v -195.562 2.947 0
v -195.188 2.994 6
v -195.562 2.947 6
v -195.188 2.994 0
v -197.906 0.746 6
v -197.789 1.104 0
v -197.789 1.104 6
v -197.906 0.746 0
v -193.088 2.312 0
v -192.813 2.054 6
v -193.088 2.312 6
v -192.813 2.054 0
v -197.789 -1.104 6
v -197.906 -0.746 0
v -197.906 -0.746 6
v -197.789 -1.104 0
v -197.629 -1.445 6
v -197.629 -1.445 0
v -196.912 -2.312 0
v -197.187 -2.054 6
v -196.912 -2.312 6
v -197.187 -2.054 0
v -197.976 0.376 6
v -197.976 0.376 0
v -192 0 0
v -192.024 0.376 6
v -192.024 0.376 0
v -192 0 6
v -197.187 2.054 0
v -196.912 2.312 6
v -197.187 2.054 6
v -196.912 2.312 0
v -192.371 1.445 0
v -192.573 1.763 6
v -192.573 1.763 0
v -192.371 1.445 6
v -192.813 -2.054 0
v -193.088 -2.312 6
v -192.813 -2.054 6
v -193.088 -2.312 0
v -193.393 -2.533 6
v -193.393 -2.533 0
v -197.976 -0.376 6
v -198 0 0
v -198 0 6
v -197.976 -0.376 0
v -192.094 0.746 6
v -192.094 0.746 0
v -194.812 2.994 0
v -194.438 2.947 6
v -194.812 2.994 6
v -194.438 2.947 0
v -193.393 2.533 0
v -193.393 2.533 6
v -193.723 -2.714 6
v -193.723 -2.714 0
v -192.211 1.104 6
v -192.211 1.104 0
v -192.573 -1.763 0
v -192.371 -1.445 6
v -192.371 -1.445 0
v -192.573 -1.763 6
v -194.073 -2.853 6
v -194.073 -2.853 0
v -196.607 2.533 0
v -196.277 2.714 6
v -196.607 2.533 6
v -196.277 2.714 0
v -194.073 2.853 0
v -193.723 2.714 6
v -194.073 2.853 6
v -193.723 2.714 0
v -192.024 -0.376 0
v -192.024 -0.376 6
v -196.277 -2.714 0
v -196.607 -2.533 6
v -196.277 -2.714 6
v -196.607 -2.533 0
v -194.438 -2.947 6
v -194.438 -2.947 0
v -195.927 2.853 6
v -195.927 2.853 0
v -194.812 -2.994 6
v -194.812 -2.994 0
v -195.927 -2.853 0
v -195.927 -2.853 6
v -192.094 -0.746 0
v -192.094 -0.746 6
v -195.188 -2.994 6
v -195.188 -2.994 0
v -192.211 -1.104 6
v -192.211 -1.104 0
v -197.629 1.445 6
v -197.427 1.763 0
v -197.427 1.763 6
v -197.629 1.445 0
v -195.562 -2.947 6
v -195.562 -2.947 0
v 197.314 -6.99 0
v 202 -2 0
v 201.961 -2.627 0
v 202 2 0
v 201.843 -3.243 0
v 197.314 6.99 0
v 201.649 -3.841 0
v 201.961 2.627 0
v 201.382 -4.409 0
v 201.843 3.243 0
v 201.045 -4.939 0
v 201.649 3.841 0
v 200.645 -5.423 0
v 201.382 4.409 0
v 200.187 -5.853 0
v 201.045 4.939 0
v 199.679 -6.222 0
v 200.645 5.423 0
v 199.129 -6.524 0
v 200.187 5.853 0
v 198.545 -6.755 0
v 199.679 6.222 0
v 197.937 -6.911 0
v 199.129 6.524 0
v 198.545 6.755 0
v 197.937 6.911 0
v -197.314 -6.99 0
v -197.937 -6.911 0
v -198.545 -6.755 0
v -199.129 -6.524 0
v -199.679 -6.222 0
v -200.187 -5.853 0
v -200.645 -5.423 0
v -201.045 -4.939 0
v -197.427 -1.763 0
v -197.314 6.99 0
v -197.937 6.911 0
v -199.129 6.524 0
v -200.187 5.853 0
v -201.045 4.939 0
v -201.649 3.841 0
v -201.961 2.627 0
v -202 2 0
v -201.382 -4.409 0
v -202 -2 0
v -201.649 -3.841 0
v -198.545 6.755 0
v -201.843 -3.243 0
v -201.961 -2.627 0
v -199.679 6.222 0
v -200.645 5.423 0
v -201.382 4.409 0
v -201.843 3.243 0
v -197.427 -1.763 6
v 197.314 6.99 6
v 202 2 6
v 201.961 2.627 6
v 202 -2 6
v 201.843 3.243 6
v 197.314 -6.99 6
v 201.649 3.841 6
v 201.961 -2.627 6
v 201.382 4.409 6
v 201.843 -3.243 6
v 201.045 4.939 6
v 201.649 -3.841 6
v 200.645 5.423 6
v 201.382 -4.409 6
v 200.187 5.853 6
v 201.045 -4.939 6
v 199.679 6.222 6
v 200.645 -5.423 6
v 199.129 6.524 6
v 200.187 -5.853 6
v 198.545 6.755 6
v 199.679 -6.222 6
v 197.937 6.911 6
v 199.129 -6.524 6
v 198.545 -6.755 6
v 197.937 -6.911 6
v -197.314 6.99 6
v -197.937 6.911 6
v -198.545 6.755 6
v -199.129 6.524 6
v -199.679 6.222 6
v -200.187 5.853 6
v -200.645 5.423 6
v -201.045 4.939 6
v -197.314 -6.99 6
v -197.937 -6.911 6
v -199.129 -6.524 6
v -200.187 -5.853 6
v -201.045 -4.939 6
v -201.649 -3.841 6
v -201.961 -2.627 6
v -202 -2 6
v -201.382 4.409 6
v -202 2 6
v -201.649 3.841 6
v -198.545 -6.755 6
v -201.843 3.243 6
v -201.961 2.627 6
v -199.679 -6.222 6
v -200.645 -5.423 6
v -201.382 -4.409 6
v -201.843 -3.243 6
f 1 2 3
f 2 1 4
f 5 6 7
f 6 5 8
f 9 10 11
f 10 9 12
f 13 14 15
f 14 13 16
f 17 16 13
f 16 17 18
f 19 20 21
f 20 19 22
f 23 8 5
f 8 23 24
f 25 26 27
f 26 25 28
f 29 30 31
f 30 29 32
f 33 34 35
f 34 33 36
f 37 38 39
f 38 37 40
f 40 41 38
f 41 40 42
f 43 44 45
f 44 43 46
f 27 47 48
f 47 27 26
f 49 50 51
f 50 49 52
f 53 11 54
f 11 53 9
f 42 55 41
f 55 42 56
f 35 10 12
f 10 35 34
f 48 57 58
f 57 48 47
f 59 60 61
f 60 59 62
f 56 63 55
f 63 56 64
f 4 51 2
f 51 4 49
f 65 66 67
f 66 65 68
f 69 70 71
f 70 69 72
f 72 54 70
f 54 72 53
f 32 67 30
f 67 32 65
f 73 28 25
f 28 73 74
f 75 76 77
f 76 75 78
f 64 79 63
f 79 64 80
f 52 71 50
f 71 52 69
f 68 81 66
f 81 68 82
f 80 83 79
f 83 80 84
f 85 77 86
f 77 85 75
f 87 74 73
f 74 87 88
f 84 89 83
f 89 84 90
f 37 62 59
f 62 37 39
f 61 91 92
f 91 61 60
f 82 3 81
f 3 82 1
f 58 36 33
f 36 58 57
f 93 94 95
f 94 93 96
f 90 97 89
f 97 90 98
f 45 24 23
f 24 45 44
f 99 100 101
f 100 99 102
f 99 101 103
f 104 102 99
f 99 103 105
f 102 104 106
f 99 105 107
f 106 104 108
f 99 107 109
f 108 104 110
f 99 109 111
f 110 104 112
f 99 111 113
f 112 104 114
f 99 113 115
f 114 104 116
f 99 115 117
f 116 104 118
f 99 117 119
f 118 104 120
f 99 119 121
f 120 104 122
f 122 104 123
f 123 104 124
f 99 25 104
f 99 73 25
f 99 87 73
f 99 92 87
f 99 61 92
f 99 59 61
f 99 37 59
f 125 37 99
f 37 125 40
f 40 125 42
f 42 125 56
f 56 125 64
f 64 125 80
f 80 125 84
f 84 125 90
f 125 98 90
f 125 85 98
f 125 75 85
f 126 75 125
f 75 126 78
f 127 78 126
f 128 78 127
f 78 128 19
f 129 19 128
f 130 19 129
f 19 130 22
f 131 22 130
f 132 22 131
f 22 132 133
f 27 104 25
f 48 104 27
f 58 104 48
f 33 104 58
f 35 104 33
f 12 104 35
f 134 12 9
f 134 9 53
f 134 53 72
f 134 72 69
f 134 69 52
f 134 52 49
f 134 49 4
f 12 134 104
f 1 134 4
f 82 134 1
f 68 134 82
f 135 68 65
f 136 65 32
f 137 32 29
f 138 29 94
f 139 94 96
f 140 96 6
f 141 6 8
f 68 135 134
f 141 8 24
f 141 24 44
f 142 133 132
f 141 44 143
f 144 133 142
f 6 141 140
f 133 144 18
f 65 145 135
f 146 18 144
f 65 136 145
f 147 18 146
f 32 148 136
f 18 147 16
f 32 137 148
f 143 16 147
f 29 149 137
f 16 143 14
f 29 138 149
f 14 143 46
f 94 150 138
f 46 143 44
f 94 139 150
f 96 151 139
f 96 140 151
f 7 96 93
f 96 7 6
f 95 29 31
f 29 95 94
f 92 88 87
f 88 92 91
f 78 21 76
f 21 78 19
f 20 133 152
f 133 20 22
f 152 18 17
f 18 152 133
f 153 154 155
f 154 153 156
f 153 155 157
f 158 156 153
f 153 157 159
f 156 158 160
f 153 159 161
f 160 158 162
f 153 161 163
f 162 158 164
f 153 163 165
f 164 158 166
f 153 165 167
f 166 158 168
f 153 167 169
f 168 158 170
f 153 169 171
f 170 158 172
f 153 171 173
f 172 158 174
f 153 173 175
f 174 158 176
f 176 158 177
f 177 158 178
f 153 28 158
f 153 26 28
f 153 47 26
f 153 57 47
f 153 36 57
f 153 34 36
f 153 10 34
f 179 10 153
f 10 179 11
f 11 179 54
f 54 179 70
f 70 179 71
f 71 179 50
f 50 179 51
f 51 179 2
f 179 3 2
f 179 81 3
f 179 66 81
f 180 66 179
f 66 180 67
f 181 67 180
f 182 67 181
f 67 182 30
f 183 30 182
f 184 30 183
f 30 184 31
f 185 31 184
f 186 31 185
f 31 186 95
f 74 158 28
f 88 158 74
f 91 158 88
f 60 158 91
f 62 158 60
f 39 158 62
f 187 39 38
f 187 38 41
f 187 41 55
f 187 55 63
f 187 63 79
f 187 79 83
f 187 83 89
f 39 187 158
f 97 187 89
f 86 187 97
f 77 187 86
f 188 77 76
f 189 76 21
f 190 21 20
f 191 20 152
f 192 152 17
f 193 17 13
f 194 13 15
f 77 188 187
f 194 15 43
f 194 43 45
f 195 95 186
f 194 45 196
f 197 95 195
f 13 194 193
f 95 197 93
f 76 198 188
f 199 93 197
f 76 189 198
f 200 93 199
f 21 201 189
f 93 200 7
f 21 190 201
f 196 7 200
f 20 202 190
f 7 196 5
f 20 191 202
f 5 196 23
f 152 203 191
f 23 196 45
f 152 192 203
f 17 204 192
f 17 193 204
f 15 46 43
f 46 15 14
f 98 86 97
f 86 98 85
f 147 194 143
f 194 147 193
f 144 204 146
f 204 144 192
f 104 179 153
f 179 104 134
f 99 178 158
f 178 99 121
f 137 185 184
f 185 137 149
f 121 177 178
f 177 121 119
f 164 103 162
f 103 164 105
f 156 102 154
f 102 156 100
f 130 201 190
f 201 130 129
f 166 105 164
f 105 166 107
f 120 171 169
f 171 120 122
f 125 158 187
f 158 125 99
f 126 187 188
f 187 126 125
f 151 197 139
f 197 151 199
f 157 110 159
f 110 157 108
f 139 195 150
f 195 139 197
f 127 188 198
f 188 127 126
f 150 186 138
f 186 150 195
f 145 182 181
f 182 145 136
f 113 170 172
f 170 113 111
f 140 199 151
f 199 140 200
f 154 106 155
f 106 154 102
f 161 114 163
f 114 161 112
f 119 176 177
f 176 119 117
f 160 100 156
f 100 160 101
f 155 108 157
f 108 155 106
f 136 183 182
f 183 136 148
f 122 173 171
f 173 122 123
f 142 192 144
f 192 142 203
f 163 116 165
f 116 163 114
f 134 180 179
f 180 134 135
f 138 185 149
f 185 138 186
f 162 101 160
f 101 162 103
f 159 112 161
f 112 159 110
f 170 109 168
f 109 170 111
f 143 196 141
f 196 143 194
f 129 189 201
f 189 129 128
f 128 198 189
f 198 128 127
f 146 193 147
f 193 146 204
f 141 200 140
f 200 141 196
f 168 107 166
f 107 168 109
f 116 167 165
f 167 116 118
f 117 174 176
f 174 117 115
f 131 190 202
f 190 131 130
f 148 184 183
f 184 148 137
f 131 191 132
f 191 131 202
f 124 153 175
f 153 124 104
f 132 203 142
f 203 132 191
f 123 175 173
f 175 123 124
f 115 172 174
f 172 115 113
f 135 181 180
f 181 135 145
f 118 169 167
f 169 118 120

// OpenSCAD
$fn = 50;


difference() {
	union() {
		hull() {
			translate(v = [-197.0000000000, 2.0000000000, 0]) {
				cylinder(h = 6, r = 5);
			}
			translate(v = [197.0000000000, 2.0000000000, 0]) {
				cylinder(h = 6, r = 5);
			}
			translate(v = [-197.0000000000, -2.0000000000, 0]) {
				cylinder(h = 6, r = 5);
			}
			translate(v = [197.0000000000, -2.0000000000, 0]) {
				cylinder(h = 6, r = 5);
			}
		}
	}
	union() {
		translate(v = [-195.0000000000, 0.0000000000, 0]) {
			cylinder(h = 6, r = 3.0000000000);
		}
		translate(v = [-195.0000000000, 0.0000000000, 0]) {
			cylinder(h = 6, r = 1.5000000000);
		}
		translate(v = [-195.0000000000, 0.0000000000, 0]) {
			cylinder(h = 6, r = 1.5000000000);
		}
		translate(v = [-195.0000000000, 0.0000000000, 0]) {
			cylinder(h = 6, r = 1.5000000000);
		}
	}
}
